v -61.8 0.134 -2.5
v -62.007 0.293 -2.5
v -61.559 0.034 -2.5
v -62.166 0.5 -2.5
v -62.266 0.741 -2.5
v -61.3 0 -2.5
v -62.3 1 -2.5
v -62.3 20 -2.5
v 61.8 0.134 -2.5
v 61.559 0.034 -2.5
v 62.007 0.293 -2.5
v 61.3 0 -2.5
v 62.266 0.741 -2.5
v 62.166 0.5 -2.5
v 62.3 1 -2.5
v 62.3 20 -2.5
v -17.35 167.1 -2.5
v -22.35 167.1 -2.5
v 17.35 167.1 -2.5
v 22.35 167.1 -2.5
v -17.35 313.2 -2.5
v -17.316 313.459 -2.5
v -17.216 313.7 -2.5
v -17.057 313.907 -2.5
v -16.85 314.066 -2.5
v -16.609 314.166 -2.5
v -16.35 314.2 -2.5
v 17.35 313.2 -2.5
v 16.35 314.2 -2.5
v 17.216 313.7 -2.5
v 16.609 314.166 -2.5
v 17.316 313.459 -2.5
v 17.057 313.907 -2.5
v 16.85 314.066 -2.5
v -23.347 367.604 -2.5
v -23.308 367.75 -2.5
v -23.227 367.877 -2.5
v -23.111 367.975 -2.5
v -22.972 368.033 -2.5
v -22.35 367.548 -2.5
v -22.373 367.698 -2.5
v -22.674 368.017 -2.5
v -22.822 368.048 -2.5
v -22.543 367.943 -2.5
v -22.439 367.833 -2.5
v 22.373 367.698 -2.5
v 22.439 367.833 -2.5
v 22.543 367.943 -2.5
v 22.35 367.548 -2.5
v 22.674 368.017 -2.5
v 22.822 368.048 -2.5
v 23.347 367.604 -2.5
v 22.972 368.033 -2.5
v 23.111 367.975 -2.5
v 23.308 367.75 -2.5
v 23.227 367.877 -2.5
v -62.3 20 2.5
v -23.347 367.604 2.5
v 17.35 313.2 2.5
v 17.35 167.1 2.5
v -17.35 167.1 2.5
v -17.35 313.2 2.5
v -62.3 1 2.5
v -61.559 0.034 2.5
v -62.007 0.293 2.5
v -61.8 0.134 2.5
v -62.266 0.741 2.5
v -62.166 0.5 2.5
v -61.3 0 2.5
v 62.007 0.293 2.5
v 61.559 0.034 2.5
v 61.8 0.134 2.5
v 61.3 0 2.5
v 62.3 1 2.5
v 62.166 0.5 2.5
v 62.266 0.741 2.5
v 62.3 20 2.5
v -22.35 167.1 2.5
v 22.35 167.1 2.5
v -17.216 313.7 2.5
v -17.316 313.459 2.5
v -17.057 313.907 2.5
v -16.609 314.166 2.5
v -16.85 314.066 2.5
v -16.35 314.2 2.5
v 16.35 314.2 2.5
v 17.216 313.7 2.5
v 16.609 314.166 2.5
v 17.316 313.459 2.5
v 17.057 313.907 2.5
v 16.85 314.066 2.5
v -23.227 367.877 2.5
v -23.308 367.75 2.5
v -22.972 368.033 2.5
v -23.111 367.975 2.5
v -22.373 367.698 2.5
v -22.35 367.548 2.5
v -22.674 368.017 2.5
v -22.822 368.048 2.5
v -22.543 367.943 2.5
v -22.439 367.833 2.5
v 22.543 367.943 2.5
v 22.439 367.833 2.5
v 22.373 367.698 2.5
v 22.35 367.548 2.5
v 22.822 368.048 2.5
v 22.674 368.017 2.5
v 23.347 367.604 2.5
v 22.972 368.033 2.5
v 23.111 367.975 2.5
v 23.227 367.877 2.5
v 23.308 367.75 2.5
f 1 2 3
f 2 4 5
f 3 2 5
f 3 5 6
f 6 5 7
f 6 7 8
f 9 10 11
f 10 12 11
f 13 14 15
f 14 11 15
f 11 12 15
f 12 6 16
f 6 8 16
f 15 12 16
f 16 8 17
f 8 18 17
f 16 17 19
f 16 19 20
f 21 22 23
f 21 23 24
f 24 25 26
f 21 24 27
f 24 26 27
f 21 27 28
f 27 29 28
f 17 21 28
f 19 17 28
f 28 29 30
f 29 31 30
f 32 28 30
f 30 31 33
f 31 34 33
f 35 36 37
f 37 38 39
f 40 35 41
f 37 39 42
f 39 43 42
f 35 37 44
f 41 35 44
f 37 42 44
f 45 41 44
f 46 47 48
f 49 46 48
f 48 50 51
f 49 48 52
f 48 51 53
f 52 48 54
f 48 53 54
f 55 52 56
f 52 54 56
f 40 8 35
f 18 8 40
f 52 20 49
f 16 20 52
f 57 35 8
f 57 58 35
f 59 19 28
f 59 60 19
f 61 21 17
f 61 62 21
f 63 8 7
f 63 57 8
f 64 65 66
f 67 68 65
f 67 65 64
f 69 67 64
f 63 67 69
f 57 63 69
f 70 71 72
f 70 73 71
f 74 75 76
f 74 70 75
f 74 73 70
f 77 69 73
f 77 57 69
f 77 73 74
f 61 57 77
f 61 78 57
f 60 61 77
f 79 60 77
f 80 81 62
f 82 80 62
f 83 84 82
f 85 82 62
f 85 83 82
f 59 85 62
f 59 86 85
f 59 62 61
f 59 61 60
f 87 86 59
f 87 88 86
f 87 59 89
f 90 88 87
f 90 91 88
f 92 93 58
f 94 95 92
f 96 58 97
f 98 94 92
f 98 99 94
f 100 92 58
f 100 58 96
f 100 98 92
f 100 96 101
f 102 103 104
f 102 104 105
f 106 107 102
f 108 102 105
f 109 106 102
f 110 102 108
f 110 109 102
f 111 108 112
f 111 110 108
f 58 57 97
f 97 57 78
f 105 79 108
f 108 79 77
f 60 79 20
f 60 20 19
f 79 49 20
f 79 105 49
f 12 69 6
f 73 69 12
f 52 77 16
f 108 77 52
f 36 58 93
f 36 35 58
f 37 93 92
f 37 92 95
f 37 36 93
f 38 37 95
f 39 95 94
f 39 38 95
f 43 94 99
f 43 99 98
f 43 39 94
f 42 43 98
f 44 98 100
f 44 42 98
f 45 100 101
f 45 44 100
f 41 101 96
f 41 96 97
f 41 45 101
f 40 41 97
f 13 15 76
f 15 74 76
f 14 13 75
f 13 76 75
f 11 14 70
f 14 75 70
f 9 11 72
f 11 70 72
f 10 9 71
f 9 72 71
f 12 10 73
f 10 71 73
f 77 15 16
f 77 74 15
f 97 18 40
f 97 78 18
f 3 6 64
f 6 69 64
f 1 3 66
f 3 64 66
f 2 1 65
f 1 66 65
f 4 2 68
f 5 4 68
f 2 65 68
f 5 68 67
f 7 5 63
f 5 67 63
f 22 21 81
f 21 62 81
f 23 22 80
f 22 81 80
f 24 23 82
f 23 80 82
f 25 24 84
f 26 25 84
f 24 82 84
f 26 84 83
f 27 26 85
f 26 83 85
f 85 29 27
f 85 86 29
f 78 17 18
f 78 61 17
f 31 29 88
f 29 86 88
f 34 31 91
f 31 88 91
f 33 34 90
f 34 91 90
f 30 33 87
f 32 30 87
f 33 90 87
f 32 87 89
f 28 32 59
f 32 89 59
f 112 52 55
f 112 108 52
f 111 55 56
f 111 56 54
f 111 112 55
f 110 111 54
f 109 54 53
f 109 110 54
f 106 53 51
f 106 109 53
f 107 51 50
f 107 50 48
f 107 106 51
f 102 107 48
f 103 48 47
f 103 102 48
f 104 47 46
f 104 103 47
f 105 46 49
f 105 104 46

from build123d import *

# Parameters (mm, degrees)
BOSS_EXTRUDE1_DEPTH = 2.5
FILLET1_R           = 1
FILLET2_R           = 0.5


with BuildPart() as part:
    # Sketch3 → Boss-Extrude1 (new, symmetric)
    with BuildSketch(Plane.XY):
        Polygon((-22.35, 376.5), (-62.3, 20), (-62.3, 0), (62.3, 0), (62.3, 20), (22.35, 376.5), (22.35, 167.1), (17.35, 167.1), (17.35, 314.2), (-17.35, 314.2), (-17.35, 167.1), (-22.35, 167.1), align=None)
    extrude(amount=BOSS_EXTRUDE1_DEPTH, both=True)

    # Fillet1
    fillet1_edges = [part.edges().sort_by_distance(p)[0] for p in [
        (-17.35, 314.2, 0),
        (17.35, 314.2, 0),
        (62.3, 0, 0),
        (-62.3, 0, 0),
    ]]
    fillet(fillet1_edges, radius=FILLET1_R)

    # Fillet2
    fillet2_edges = [part.edges().sort_by_distance(p)[0] for p in [
        (22.35, 376.5, 0),
        (-22.35, 376.5, 0),
    ]]
    fillet(fillet2_edges, radius=FILLET2_R)


solid = part.part
